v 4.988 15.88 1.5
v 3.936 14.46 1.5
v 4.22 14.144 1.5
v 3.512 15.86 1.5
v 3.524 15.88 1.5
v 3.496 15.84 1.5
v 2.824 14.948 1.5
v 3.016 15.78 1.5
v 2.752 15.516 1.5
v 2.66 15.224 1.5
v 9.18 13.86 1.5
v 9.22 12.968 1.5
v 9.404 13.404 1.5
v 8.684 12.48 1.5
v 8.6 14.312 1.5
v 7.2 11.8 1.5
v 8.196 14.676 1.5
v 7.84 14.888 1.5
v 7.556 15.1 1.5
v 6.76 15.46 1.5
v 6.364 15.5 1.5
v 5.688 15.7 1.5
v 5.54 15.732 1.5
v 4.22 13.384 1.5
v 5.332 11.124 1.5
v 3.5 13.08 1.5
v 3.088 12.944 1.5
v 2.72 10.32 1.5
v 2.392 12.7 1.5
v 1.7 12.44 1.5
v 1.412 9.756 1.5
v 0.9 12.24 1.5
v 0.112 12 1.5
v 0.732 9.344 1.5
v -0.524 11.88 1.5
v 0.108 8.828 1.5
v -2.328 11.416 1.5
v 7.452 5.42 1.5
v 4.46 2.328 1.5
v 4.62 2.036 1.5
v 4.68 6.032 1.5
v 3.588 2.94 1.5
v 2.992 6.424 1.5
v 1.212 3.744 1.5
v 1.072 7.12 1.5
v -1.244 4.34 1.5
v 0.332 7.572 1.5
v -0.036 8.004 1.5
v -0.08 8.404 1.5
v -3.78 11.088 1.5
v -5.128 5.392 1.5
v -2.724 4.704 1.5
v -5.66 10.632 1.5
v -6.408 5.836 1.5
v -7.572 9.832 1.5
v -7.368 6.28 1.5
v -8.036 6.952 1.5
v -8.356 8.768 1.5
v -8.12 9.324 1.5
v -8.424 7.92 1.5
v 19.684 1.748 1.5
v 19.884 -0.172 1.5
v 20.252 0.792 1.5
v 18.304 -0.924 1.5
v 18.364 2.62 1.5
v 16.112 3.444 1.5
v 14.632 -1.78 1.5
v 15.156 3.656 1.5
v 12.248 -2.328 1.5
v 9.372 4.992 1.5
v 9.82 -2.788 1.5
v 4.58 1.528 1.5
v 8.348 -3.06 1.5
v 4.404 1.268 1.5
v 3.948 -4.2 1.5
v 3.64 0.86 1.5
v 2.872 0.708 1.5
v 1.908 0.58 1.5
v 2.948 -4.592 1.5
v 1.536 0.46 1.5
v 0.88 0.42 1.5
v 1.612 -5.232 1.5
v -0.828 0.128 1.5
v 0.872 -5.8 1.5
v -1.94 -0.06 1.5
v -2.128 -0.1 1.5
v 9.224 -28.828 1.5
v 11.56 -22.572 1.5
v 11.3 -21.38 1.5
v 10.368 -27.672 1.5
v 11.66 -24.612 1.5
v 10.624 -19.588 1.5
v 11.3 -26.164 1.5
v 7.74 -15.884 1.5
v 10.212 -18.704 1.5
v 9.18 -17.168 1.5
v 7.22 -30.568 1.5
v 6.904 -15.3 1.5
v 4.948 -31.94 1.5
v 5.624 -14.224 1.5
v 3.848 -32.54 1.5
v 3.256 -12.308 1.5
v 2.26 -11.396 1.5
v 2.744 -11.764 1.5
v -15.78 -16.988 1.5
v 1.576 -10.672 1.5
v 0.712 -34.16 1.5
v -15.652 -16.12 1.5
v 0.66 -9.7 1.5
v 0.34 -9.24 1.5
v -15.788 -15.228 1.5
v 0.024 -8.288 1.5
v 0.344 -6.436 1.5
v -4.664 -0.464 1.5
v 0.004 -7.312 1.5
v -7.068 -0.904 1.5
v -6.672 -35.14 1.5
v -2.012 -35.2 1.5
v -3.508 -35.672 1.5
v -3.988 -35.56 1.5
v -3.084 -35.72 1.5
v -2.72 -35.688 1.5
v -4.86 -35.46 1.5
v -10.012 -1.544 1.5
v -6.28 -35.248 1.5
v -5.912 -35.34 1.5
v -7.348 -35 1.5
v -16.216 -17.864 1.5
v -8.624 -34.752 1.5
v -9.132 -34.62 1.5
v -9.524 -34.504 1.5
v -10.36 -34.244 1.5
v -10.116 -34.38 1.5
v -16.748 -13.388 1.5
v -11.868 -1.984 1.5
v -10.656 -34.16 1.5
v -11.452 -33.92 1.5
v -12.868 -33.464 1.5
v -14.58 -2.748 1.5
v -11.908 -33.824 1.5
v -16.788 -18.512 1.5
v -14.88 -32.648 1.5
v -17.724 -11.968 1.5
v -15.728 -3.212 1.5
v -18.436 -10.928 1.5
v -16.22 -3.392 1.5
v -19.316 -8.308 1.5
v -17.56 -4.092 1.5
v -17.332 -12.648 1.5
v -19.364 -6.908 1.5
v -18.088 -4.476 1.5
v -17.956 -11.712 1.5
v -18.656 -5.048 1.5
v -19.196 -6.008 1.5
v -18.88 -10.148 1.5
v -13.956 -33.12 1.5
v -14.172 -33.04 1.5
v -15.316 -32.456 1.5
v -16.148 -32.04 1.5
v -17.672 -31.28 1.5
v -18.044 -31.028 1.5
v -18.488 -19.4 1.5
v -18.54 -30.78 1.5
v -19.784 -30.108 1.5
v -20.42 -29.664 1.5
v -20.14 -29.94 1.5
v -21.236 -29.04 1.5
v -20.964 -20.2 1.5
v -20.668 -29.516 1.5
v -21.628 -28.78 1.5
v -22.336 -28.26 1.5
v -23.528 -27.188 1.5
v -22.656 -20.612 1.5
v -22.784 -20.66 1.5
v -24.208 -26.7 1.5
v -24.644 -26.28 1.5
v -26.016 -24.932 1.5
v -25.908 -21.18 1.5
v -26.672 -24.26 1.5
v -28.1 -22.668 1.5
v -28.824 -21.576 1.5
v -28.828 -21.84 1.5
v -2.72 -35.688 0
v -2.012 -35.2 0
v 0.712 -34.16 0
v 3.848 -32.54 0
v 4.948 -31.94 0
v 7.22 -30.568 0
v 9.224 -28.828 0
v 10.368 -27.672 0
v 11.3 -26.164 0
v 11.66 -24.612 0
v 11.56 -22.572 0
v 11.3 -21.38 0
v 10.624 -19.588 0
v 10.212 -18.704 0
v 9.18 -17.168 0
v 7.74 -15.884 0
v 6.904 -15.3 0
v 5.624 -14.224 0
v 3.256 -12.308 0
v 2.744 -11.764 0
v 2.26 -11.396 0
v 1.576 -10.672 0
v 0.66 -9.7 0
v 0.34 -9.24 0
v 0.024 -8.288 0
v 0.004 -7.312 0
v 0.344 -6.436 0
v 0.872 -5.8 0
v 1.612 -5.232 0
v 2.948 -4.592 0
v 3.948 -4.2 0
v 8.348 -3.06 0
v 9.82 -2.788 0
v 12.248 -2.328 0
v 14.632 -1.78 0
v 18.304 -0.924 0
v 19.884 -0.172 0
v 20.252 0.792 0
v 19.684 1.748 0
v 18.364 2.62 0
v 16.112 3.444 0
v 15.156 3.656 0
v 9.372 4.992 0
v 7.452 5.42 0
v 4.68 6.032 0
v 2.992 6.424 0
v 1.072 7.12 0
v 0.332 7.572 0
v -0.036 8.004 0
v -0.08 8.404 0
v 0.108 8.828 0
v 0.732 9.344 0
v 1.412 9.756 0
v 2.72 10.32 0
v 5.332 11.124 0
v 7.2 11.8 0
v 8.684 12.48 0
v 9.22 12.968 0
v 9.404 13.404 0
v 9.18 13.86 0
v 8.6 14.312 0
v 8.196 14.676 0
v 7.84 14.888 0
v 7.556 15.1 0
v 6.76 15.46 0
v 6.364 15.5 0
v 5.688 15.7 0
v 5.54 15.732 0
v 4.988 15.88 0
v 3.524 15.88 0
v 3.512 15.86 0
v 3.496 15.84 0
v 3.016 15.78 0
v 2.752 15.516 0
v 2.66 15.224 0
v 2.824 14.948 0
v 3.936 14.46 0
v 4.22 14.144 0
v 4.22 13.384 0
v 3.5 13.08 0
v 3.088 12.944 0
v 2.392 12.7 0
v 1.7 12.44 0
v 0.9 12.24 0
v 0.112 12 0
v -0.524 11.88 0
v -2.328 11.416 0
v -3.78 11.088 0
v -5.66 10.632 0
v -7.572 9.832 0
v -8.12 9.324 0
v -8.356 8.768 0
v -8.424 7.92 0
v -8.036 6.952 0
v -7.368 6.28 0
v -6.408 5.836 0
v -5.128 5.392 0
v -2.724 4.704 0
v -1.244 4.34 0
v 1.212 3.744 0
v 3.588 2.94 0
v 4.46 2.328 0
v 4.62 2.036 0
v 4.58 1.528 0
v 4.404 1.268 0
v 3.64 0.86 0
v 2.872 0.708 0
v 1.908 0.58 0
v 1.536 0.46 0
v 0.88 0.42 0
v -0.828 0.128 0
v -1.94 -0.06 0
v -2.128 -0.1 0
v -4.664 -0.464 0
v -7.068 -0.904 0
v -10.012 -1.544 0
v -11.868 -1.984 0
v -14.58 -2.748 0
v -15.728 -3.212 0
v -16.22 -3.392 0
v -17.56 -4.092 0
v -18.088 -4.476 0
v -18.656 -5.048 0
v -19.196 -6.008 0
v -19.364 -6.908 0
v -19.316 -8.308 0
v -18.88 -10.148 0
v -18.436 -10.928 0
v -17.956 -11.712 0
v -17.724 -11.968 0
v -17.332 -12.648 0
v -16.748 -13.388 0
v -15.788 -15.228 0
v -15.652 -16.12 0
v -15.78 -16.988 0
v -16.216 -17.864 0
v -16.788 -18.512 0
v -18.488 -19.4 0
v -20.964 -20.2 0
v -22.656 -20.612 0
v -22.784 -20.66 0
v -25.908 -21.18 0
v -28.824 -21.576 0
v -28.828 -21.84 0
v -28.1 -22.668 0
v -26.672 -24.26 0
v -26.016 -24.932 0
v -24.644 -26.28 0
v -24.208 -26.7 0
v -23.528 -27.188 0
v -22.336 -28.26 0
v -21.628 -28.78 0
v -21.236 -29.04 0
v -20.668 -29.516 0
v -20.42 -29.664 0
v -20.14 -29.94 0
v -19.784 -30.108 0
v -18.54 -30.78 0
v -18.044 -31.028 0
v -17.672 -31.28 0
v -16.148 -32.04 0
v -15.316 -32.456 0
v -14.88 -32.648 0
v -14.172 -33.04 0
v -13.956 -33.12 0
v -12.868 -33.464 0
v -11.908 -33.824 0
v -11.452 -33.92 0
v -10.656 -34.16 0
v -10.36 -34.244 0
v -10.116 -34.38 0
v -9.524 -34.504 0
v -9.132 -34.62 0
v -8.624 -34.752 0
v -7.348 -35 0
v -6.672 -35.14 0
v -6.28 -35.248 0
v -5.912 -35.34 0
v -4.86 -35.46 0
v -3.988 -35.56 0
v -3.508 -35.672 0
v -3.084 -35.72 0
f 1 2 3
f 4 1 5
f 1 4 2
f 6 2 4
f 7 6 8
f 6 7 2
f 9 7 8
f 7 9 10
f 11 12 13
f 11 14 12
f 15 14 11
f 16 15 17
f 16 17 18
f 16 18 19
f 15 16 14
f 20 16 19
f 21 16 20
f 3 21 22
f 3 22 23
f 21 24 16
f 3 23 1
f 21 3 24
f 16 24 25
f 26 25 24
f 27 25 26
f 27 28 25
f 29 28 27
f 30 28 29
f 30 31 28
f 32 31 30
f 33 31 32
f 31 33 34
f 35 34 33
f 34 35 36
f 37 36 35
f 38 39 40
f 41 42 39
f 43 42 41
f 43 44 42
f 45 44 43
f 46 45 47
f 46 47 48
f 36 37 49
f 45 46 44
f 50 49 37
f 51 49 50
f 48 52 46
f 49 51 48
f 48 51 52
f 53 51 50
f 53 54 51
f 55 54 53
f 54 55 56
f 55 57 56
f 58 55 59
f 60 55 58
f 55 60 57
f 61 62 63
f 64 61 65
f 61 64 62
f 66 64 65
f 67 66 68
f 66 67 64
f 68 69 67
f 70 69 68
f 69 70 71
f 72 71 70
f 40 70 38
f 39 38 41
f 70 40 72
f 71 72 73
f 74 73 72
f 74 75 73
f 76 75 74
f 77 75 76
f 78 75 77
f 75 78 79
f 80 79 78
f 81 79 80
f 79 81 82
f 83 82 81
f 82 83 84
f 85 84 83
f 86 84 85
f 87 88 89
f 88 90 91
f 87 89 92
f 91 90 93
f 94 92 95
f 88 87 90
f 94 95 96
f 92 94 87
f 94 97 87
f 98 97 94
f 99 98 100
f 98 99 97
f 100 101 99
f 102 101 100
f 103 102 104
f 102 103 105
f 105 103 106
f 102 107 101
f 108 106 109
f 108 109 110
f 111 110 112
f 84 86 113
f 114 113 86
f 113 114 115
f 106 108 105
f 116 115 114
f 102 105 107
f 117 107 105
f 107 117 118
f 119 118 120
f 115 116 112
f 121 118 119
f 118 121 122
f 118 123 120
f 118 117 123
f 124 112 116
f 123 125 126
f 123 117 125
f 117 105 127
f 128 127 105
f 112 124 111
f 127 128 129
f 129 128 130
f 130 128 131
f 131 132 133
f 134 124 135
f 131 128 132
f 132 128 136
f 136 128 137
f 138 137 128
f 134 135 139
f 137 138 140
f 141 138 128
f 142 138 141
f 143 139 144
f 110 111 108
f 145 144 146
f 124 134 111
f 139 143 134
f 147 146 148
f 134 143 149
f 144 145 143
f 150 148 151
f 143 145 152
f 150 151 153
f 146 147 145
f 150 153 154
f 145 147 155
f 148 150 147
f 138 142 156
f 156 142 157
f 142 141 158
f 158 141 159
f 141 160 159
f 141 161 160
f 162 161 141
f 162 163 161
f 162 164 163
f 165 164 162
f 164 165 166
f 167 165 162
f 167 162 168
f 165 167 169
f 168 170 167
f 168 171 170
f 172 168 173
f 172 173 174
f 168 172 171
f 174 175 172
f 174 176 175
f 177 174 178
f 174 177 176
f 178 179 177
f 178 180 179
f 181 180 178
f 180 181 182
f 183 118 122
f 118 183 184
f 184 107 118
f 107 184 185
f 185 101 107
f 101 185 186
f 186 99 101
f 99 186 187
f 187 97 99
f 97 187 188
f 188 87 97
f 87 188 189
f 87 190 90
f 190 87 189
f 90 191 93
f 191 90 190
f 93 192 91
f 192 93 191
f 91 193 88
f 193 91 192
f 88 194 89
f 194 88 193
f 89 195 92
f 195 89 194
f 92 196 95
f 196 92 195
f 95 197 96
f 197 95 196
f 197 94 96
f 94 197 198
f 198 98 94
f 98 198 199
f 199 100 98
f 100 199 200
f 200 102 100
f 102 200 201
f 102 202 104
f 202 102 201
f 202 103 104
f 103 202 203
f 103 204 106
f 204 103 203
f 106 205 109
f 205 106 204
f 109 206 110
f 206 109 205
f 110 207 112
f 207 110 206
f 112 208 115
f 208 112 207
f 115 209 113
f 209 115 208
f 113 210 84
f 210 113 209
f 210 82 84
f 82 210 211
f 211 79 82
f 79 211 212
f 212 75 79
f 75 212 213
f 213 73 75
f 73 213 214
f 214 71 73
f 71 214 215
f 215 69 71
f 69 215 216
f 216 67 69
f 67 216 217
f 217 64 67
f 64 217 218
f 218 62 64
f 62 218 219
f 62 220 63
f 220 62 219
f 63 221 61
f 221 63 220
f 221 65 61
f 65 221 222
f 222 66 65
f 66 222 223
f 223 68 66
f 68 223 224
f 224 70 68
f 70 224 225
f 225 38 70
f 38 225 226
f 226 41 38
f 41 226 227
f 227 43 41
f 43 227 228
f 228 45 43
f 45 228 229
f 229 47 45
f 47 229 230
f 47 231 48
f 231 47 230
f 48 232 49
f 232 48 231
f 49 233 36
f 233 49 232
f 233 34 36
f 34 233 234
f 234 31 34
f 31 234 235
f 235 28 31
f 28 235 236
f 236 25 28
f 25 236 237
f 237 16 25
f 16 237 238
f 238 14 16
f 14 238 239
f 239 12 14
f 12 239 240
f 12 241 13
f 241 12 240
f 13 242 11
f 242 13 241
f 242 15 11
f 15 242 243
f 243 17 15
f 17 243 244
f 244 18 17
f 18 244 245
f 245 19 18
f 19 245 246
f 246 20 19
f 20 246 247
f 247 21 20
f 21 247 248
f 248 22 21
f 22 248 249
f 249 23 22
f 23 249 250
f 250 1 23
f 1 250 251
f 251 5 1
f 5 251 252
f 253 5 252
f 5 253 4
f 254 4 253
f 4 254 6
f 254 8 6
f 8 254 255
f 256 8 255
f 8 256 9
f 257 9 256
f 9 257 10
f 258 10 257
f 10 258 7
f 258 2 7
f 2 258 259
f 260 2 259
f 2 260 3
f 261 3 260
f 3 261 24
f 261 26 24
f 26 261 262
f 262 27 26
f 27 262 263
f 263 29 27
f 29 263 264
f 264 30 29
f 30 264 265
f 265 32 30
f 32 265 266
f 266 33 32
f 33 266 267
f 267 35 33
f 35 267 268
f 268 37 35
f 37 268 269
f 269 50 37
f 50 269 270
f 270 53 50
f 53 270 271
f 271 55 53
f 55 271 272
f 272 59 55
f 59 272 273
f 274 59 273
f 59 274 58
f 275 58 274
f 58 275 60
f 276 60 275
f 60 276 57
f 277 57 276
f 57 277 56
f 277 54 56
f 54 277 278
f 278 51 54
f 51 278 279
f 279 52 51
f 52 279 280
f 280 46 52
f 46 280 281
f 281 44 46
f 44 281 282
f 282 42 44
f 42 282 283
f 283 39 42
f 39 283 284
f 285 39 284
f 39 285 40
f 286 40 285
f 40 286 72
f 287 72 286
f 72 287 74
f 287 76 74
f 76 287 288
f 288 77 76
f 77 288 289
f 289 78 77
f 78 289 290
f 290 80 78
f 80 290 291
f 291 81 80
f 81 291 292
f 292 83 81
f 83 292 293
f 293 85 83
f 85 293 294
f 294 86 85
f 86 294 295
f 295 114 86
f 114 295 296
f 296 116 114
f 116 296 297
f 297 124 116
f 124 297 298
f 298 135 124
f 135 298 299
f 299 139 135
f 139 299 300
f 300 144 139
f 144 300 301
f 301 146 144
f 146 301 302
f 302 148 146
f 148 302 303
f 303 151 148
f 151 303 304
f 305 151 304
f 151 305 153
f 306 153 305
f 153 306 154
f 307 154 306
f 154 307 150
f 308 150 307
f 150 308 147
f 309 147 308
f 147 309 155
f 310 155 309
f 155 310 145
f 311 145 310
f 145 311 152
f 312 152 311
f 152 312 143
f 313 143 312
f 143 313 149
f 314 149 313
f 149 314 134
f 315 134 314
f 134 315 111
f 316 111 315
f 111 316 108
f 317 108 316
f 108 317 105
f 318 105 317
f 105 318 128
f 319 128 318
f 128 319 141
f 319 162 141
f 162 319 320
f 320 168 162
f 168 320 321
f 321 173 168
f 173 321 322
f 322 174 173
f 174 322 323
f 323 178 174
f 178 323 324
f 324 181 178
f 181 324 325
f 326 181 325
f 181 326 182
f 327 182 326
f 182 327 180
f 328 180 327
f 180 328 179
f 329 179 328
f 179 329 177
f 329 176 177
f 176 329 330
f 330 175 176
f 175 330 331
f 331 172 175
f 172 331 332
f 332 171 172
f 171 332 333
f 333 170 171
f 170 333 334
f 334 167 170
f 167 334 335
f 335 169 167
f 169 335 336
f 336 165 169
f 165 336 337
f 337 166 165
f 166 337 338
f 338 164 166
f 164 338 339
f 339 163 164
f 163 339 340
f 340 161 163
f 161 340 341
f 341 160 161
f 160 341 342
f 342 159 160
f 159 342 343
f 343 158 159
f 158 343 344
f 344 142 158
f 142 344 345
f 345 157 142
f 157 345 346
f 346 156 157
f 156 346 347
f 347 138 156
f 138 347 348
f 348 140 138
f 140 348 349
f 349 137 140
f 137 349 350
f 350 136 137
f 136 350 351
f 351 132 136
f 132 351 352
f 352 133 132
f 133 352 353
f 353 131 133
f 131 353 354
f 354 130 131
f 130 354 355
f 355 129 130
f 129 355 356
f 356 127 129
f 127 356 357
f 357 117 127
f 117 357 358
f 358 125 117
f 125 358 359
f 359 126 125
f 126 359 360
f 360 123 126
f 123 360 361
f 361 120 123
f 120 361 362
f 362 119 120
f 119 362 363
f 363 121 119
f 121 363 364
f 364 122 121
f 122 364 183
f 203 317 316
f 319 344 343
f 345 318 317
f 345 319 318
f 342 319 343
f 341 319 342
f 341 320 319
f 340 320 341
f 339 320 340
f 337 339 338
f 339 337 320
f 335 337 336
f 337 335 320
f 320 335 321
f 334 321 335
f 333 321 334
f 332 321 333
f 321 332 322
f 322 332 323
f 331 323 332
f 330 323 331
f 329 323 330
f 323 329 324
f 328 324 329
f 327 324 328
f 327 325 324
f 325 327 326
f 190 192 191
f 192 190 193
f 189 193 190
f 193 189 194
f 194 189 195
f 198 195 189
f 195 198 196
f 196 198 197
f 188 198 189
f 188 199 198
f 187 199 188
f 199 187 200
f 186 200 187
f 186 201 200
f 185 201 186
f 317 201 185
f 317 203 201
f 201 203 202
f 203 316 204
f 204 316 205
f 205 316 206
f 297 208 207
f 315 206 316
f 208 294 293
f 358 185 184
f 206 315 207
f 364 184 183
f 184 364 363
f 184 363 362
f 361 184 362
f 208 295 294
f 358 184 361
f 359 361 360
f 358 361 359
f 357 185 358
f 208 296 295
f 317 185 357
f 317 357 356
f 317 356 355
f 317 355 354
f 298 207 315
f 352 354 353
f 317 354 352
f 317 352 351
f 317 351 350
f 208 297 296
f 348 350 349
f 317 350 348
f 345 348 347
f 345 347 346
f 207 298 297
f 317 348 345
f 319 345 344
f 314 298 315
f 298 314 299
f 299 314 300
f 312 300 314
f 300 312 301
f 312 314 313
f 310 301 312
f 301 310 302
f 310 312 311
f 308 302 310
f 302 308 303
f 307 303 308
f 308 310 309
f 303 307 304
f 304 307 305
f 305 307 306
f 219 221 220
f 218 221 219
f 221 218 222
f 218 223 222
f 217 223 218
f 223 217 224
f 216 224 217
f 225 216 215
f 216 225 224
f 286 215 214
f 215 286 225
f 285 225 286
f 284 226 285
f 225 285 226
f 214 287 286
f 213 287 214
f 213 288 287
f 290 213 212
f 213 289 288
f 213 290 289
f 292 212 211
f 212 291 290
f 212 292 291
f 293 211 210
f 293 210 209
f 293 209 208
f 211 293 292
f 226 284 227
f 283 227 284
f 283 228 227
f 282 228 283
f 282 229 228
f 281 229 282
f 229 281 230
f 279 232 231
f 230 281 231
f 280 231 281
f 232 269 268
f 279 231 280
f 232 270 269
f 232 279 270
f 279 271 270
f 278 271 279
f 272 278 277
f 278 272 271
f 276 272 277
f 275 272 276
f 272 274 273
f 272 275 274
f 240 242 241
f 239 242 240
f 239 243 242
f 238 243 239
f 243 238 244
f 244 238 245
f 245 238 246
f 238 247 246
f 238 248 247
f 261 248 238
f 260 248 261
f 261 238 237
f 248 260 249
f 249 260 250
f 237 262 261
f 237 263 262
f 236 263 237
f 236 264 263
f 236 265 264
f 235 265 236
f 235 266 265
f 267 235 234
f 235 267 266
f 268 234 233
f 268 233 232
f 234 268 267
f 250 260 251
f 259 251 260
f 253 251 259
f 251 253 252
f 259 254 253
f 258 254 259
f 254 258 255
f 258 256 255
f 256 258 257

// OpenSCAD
// file: C1white2.scad
module C1white2_1()
{
 /* Generated by trace2scad version 20150415
    http://aggregate.org/MAKE/TRACE2SCAD/
    Optimized model has 279/3068 original points
 */
 color([0.5, 0.5, 0.5])
 assign(minx=0) /* polygon minx=0 */
 assign(miny=0) /* polygon miny=0 */
 assign(maxx=20000) /* polygon maxx=20000 */
 assign(maxy=19690) /* polygon maxy=19690 */
 assign(dx=maxx-minx)
 assign(dy=maxy-miny)
 assign(maxd=((dx>dy)?dx:dy))
 scale([1/maxd, 1/maxd, 1])
 translate([-minx-dx/2, -miny-dy/2, 0])
 linear_extrude(height=1, convexity=279)
 union() {
  union() {
   polygon([[1,18799],[3,17908],[221,17839],[472,17805],[701,17833],[908,17890],[1153,18025],[1430,18292],[1584,18588],[1629,18742],[1660,18993],[1623,19271],[1575,19428],[1438,19676],[1425,19690],[0,19690]], convexity=5);
   polygon([[18275,19684],[18275,19678],[18190,19480],[18139,19274],[18133,19174],[18133,19061],[18165,18838],[18210,18684],[18345,18443],[18390,18373],[18617,18160],[18878,18016],[19060,17965],[19152,17947],[19364,17930],[19474,17948],[19726,18011],[20000,18151],[20000,19690],[18275,19690]], convexity=7);
   union() {
    difference() {
     polygon([[9773,19182],[9718,19180],[8873,19120],[7988,18976],[7175,18765],[6498,18531],[5833,18244],[5096,17850],[4363,17369],[3699,16841],[3097,16268],[2607,15718],[2098,15036],[1666,14338],[1281,13563],[979,12783],[740,11942],[589,11128],[510,10283],[504,9644],[560,8823],[704,7938],[915,7135],[1174,6408],[1514,5663],[1945,4913],[2375,4295],[2908,3651],[3556,3003],[4169,2493],[4825,2033],[5523,1629],[6286,1270],[7128,965],[7968,745],[8790,607],[9468,546],[9981,529],[10883,575],[11771,700],[12613,899],[13443,1176],[14106,1460],[14877,1872],[15563,2320],[16203,2822],[16744,3324],[17328,3964],[17799,4583],[18245,5288],[18623,6023],[18921,6753],[19154,7498],[19328,8298],[19430,9088],[19466,9859],[19420,10743],[19299,11583],[19115,12358],[18863,13123],[18575,13801],[18159,14578],[17698,15275],[17248,15848],[16943,16192],[16371,16747],[15728,17275],[15083,17719],[14408,18105],[13608,18475],[12805,18760],[11998,18971],[11133,19115],[10288,19180],[9828,19184]], convexity=6);
     polygon([[10388,18710],[10478,18705],[11319,18620],[12088,18474],[12798,18276],[13573,17989],[14273,17656],[14953,17259],[15648,16763],[16268,16228],[16828,15645],[17303,15058],[17761,14373],[18120,13717],[18439,12993],[18700,12210],[18869,11498],[18987,10688],[19025,10148],[19015,9353],[18930,8540],[18765,7718],[18544,6978],[18230,6197],[17895,5542],[17466,4858],[16998,4238],[16541,3728],[15985,3202],[15363,2707],[14682,2259],[14032,1907],[13308,1589],[12576,1340],[11763,1140],[10968,1020],[10298,970],[9493,980],[8646,1065],[7898,1204],[7088,1434],[6350,1714],[5606,2074],[4913,2491],[4247,2978],[3668,3484],[3090,4092],[2566,4758],[2114,5463],[1764,6133],[1464,6853],[1224,7618],[1051,8433],[960,9193],[943,9843],[960,10493],[1055,11283],[1235,12108],[1496,12918],[1794,13618],[2152,14288],[2599,14973],[3090,15593],[3500,16032],[4071,16563],[4718,17061],[5415,17504],[6150,17882],[6928,18197],[7678,18424],[8468,18592],[9318,18695],[9965,18714],[10298,18715]], convexity=6);
    }
    polygon([[5470,15212],[5438,15210],[5033,15163],[4693,15054],[4425,14896],[4204,14688],[4084,14518],[3981,14288],[3910,13988],[3898,13553],[3956,13218],[4062,12953],[4234,12708],[4468,12501],[4765,12345],[5118,12251],[5533,12216],[5966,12255],[6328,12346],[6408,12373],[6405,13115],[6168,12978],[5913,12896],[5655,12875],[5440,12891],[5252,12952],[5118,13032],[4966,13202],[4875,13414],[4840,13641],[4850,13893],[4910,14121],[5012,14291],[5175,14436],[5378,14524],[5530,14555],[5828,14546],[6093,14477],[6338,14356],[6410,14321],[6410,15045],[6008,15164],[5625,15210],[5503,15213]], convexity=12);
    polygon([[13037,14948],[13034,14940],[13636,12665],[14427,12671],[14814,14231],[15206,12665],[15994,12671],[16589,14949],[15894,14948],[15498,13403],[15114,14955],[14509,14946],[14118,13388],[13734,14955],[13040,14955]], convexity=11);
   }
   polygon([[19317,1895],[19313,1891],[19054,1852],[18793,1743],[18637,1640],[18420,1407],[18319,1238],[18230,1004],[18192,716],[18215,488],[18257,332],[18390,63],[18428,3],[20000,0],[20000,1719],[19773,1825],[19567,1880],[19322,1900]], convexity=6);
   polygon([[417,1770],[413,1766],[194,1738],[3,1672],[0,0],[1498,0],[1595,225],[1629,342],[1650,479],[1655,643],[1623,863],[1544,1085],[1415,1303],[1173,1545],[875,1700],[665,1755],[422,1775]], convexity=5);
  }
 }
}

module C1white2()
{
 /* all layers combined, scaled to within a 1mm cube */
 scale([1, 1, 1/1])
 difference() {
  union() {
   scale([1,1,2]) translate([0,0,-0.5]) C1white2_1();
  }
  translate([0,0,-2]) cube([2,2,4],center=true);
 }
}
C1white2();
// file: C1purple2.scad
module C1purple2_1()
{
 /* Generated by trace2scad version 20150415
    http://aggregate.org/MAKE/TRACE2SCAD/
    Optimized model has 253/3033 original points
 */
 color([0.5, 0.5, 0.5])
 assign(minx=0) /* polygon minx=0 */
 assign(miny=0) /* polygon miny=0 */
 assign(maxx=20000) /* polygon maxx=20000 */
 assign(maxy=19690) /* polygon maxy=19690 */
 assign(dx=maxx-minx)
 assign(dy=maxy-miny)
 assign(maxd=((dx>dy)?dx:dy))
 scale([1/maxd, 1/maxd, 1])
 translate([-minx-dx/2, -miny-dy/2, 0])
 linear_extrude(height=1, convexity=253)
 union() {
  union() {
   polygon([[1,18799],[3,17908],[221,17839],[472,17805],[701,17833],[908,17890],[1153,18025],[1430,18292],[1584,18588],[1629,18742],[1660,18993],[1623,19271],[1575,19428],[1438,19676],[1425,19690],[0,19690]], convexity=5);
   polygon([[18275,19684],[18275,19678],[18190,19480],[18139,19274],[18133,19174],[18133,19061],[18165,18838],[18210,18684],[18345,18443],[18390,18373],[18617,18160],[18878,18016],[19060,17965],[19152,17947],[19364,17930],[19474,17948],[19726,18011],[20000,18151],[20000,19690],[18275,19690]], convexity=7);
   polygon([[10878,13810],[10874,13805],[10754,13790],[10688,13724],[10665,13651],[10706,13582],[10984,13460],[11055,13381],[11055,13191],[10875,13115],[10772,13081],[10598,13020],[10425,12955],[10225,12905],[10028,12845],[9869,12815],[9418,12699],[9055,12617],[8585,12503],[8107,12303],[7970,12176],[7911,12037],[7894,11825],[7991,11583],[8158,11415],[8398,11304],[8718,11193],[9319,11021],[9689,10930],[10303,10781],[10897,10580],[11115,10427],[11155,10354],[11145,10227],[11101,10162],[10910,10060],[10718,10022],[10477,9990],[10384,9960],[10220,9950],[9793,9877],[9515,9830],[9468,9820],[8834,9729],[8233,9619],[7497,9459],[7033,9349],[6355,9158],[6068,9042],[5945,8997],[5610,8822],[5478,8726],[5336,8583],[5201,8343],[5159,8118],[5171,7768],[5280,7308],[5391,7113],[5511,6917],[5569,6853],[5667,6683],[5813,6498],[6053,6038],[6087,5815],[6055,5598],[5946,5379],[5803,5217],[5378,4995],[4759,4795],[4336,4692],[4304,4680],[3523,4550],[2794,4451],[2793,4385],[2975,4178],[3332,3780],[3496,3612],[3839,3275],[3948,3170],[4118,3048],[4416,2780],[4593,2650],[4691,2585],[4833,2466],[4895,2429],[4965,2360],[5054,2318],[5365,2150],[5489,2088],[5582,2025],[5963,1835],[6171,1731],[6280,1683],[6457,1585],[6511,1565],[6783,1479],[7023,1389],[7137,1365],[7336,1305],[7410,1284],[7471,1250],[7619,1219],[7717,1190],[7844,1157],[8163,1095],[8332,1060],[8430,1033],[8522,1010],[8785,980],[9003,955],[9123,927],[9229,915],[9320,923],[9497,1045],[10178,1305],[10962,1710],[11237,1860],[11805,2203],[12306,2638],[12592,2927],[12825,3304],[12915,3692],[12890,4202],[12825,4500],[12656,4948],[12553,5169],[12295,5553],[11935,5874],[11726,6020],[11406,6289],[10814,6768],[10686,6904],[10565,6996],[10394,7177],[10165,7420],[10085,7535],[10006,7773],[10001,8017],[10086,8236],[10218,8395],[10403,8537],[10737,8697],[10987,8795],[12087,9080],[12455,9148],[13062,9263],[13658,9400],[14576,9614],[14971,9802],[15063,10043],[14921,10282],[14591,10500],[14028,10706],[13789,10759],[12343,11093],[11863,11200],[11170,11353],[10748,11451],[10268,11625],[10083,11738],[9991,11846],[9980,11946],[10027,12052],[10183,12181],[10353,12284],[10680,12425],[11333,12626],[11800,12795],[12171,12965],[12305,13087],[12351,13196],[12295,13310],[12150,13423],[12049,13514],[11960,13567],[11889,13620],[11690,13710],[11591,13720],[11422,13770],[11385,13778],[11247,13815],[10881,13815]], convexity=16);
   polygon([[19317,1895],[19313,1891],[19054,1852],[18793,1743],[18637,1640],[18420,1407],[18319,1238],[18230,1004],[18192,716],[18215,488],[18257,332],[18390,63],[18428,3],[20000,0],[20000,1719],[19773,1825],[19567,1880],[19322,1900]], convexity=6);
   polygon([[417,1770],[413,1766],[194,1738],[3,1672],[0,0],[1498,0],[1595,225],[1629,342],[1650,479],[1655,643],[1623,863],[1544,1085],[1415,1303],[1173,1545],[875,1700],[665,1755],[422,1775]], convexity=5);
  }
 }
}

module C1purple2()
{
 /* all layers combined, scaled to within a 1mm cube */
 scale([1, 1, 1/1])
 difference() {
  union() {
   scale([1,1,2]) translate([0,0,-0.5]) C1purple2_1();
  }
  translate([0,0,-2]) cube([2,2,4],center=true);
 }
}
C1purple2();
// file: C1purple.scad
module C1purple_1()
{
 /* Generated by trace2scad version 20150415
    http://aggregate.org/MAKE/TRACE2SCAD/
    Optimized model has 251/3093 original points
 */
 color([0.5, 0.5, 0.5])
 assign(minx=0) /* polygon minx=0 */
 assign(miny=0) /* polygon miny=0 */
 assign(maxx=20000) /* polygon maxx=20000 */
 assign(maxy=19690) /* polygon maxy=19690 */
 assign(dx=maxx-minx)
 assign(dy=maxy-miny)
 assign(maxd=((dx>dy)?dx:dy))
 scale([1/maxd, 1/maxd, 1])
 translate([-minx-dx/2, -miny-dy/2, 0])
 linear_extrude(height=1, convexity=251)
 union() {
  union() {
   polygon([[1,18799],[3,17908],[221,17839],[472,17805],[701,17833],[908,17890],[1153,18025],[1430,18292],[1584,18588],[1629,18742],[1660,18993],[1623,19271],[1575,19428],[1438,19676],[1425,19690],[0,19690]], convexity=5);
   polygon([[18275,19684],[18275,19678],[18190,19480],[18139,19274],[18133,19174],[18133,19061],[18165,18838],[18210,18684],[18345,18443],[18390,18373],[18617,18160],[18878,18016],[19060,17965],[19152,17947],[19364,17930],[19474,17948],[19726,18011],[20000,18151],[20000,19690],[18275,19690]], convexity=7);
   polygon([[10765,13695],[10758,13690],[10770,13642],[11014,13508],[11223,13408],[11315,13303],[11331,13201],[11276,13098],[11170,13020],[10593,12893],[9863,12785],[9569,12731],[9108,12629],[8585,12503],[8109,12302],[7999,12212],[7918,12055],[7894,11842],[7994,11586],[8161,11413],[8414,11302],[8683,11205],[9313,11025],[9648,10936],[10172,10825],[10878,10591],[11115,10435],[11155,10354],[11145,10227],[11094,10156],[10873,10044],[10456,9979],[10328,9960],[10085,9920],[9515,9830],[9468,9820],[8834,9729],[8328,9640],[7497,9459],[7005,9337],[6313,9141],[6063,9037],[5950,8997],[5608,8818],[5474,8723],[5342,8588],[5200,8317],[5160,8105],[5167,7810],[5268,7358],[5330,7213],[5448,7018],[5523,6910],[5595,6805],[5669,6682],[5816,6495],[5966,6218],[6060,6018],[6086,5815],[6058,5605],[5968,5412],[5803,5217],[5378,4995],[4759,4795],[4336,4692],[4304,4680],[4019,4631],[3568,4557],[3241,4511],[2794,4451],[2793,4385],[2975,4178],[3332,3780],[3496,3612],[3839,3275],[3948,3170],[4118,3048],[4416,2780],[4593,2650],[4691,2585],[4833,2466],[4895,2429],[4965,2360],[5054,2318],[5365,2150],[5489,2087],[5583,2025],[5963,1835],[6171,1731],[6280,1683],[6458,1585],[6511,1565],[6783,1479],[7023,1389],[7137,1365],[7336,1305],[7410,1284],[7471,1250],[7619,1219],[7717,1190],[7844,1157],[8163,1095],[8333,1060],[8430,1033],[8522,1010],[8785,980],[9003,955],[9123,927],[9229,915],[9320,923],[9470,1030],[10055,1260],[10178,1305],[10963,1710],[11238,1860],[11806,2203],[12313,2640],[12590,2926],[12807,3263],[12870,3488],[12916,3708],[12881,4243],[12816,4528],[12666,4923],[12553,5169],[12271,5578],[11997,5828],[11553,6155],[11253,6415],[10998,6613],[10826,6748],[10695,6893],[10532,7031],[10383,7183],[10118,7475],[10050,7623],[10004,7758],[10002,8034],[10075,8225],[10215,8395],[10408,8539],[10708,8690],[10987,8795],[11869,9026],[12087,9080],[12453,9147],[13019,9252],[13658,9400],[14073,9492],[14592,9623],[14971,9802],[15065,10041],[14922,10280],[14592,10500],[14028,10706],[13789,10759],[13260,10883],[12343,11093],[11863,11200],[11170,11352],[10748,11450],[10269,11621],[10055,11759],[9984,11852],[9985,11981],[10026,12060],[10202,12198],[10362,12289],[10666,12425],[11263,12602],[11754,12775],[12158,12961],[12298,13075],[12343,13212],[12318,13278],[12135,13415],[11753,13540],[11189,13663],[11060,13680],[10773,13700]], convexity=16);
   polygon([[19317,1895],[19313,1891],[19054,1852],[18793,1743],[18637,1640],[18420,1407],[18319,1238],[18230,1004],[18192,716],[18215,488],[18257,332],[18390,63],[18428,3],[20000,0],[20000,1719],[19773,1825],[19567,1880],[19322,1900]], convexity=6);
   polygon([[417,1770],[413,1766],[194,1738],[3,1672],[0,0],[1498,0],[1595,225],[1629,342],[1650,479],[1655,643],[1623,863],[1544,1085],[1415,1303],[1173,1545],[875,1700],[665,1755],[422,1775]], convexity=5);
  }
 }
}

module C1purple()
{
 /* all layers combined, scaled to within a 1mm cube */
 scale([1, 1, 1/1])
 difference() {
  union() {
   scale([1,1,2]) translate([0,0,-0.5]) C1purple_1();
  }
  translate([0,0,-2]) cube([2,2,4],center=true);
 }
}
C1purple();
// main file
// CrickWooder.scad
//
//------------------------------------------------


use <./C1purple.scad>
use <./C1purple2.scad>
use <./C1white1.scad>
use <./C1white2.scad>

//=====================================================

if(1){
intersection(){
  translate([0.6,-1,0])
  cylinder(r=40,h=1.5,$fn=300);

  scale([80,80,1.5]){
    
    //color("white")
    //C1white1();
    //C1white2();
    //color("purple")
    //C1purple();
    C1purple2();

    }
  }
}

// get black by subtraction so no voids between parts
if(0){
  color("black")
difference(){
  cylinder(r=37,h=1.5,$fn=300);

  translate([0,0,-1])
  scale([80,80,4]){
  
//  C1purple();
  C1purple2();
  //C1white1();
  C1white2();
  
  }
  
}
}



//=====================================================
